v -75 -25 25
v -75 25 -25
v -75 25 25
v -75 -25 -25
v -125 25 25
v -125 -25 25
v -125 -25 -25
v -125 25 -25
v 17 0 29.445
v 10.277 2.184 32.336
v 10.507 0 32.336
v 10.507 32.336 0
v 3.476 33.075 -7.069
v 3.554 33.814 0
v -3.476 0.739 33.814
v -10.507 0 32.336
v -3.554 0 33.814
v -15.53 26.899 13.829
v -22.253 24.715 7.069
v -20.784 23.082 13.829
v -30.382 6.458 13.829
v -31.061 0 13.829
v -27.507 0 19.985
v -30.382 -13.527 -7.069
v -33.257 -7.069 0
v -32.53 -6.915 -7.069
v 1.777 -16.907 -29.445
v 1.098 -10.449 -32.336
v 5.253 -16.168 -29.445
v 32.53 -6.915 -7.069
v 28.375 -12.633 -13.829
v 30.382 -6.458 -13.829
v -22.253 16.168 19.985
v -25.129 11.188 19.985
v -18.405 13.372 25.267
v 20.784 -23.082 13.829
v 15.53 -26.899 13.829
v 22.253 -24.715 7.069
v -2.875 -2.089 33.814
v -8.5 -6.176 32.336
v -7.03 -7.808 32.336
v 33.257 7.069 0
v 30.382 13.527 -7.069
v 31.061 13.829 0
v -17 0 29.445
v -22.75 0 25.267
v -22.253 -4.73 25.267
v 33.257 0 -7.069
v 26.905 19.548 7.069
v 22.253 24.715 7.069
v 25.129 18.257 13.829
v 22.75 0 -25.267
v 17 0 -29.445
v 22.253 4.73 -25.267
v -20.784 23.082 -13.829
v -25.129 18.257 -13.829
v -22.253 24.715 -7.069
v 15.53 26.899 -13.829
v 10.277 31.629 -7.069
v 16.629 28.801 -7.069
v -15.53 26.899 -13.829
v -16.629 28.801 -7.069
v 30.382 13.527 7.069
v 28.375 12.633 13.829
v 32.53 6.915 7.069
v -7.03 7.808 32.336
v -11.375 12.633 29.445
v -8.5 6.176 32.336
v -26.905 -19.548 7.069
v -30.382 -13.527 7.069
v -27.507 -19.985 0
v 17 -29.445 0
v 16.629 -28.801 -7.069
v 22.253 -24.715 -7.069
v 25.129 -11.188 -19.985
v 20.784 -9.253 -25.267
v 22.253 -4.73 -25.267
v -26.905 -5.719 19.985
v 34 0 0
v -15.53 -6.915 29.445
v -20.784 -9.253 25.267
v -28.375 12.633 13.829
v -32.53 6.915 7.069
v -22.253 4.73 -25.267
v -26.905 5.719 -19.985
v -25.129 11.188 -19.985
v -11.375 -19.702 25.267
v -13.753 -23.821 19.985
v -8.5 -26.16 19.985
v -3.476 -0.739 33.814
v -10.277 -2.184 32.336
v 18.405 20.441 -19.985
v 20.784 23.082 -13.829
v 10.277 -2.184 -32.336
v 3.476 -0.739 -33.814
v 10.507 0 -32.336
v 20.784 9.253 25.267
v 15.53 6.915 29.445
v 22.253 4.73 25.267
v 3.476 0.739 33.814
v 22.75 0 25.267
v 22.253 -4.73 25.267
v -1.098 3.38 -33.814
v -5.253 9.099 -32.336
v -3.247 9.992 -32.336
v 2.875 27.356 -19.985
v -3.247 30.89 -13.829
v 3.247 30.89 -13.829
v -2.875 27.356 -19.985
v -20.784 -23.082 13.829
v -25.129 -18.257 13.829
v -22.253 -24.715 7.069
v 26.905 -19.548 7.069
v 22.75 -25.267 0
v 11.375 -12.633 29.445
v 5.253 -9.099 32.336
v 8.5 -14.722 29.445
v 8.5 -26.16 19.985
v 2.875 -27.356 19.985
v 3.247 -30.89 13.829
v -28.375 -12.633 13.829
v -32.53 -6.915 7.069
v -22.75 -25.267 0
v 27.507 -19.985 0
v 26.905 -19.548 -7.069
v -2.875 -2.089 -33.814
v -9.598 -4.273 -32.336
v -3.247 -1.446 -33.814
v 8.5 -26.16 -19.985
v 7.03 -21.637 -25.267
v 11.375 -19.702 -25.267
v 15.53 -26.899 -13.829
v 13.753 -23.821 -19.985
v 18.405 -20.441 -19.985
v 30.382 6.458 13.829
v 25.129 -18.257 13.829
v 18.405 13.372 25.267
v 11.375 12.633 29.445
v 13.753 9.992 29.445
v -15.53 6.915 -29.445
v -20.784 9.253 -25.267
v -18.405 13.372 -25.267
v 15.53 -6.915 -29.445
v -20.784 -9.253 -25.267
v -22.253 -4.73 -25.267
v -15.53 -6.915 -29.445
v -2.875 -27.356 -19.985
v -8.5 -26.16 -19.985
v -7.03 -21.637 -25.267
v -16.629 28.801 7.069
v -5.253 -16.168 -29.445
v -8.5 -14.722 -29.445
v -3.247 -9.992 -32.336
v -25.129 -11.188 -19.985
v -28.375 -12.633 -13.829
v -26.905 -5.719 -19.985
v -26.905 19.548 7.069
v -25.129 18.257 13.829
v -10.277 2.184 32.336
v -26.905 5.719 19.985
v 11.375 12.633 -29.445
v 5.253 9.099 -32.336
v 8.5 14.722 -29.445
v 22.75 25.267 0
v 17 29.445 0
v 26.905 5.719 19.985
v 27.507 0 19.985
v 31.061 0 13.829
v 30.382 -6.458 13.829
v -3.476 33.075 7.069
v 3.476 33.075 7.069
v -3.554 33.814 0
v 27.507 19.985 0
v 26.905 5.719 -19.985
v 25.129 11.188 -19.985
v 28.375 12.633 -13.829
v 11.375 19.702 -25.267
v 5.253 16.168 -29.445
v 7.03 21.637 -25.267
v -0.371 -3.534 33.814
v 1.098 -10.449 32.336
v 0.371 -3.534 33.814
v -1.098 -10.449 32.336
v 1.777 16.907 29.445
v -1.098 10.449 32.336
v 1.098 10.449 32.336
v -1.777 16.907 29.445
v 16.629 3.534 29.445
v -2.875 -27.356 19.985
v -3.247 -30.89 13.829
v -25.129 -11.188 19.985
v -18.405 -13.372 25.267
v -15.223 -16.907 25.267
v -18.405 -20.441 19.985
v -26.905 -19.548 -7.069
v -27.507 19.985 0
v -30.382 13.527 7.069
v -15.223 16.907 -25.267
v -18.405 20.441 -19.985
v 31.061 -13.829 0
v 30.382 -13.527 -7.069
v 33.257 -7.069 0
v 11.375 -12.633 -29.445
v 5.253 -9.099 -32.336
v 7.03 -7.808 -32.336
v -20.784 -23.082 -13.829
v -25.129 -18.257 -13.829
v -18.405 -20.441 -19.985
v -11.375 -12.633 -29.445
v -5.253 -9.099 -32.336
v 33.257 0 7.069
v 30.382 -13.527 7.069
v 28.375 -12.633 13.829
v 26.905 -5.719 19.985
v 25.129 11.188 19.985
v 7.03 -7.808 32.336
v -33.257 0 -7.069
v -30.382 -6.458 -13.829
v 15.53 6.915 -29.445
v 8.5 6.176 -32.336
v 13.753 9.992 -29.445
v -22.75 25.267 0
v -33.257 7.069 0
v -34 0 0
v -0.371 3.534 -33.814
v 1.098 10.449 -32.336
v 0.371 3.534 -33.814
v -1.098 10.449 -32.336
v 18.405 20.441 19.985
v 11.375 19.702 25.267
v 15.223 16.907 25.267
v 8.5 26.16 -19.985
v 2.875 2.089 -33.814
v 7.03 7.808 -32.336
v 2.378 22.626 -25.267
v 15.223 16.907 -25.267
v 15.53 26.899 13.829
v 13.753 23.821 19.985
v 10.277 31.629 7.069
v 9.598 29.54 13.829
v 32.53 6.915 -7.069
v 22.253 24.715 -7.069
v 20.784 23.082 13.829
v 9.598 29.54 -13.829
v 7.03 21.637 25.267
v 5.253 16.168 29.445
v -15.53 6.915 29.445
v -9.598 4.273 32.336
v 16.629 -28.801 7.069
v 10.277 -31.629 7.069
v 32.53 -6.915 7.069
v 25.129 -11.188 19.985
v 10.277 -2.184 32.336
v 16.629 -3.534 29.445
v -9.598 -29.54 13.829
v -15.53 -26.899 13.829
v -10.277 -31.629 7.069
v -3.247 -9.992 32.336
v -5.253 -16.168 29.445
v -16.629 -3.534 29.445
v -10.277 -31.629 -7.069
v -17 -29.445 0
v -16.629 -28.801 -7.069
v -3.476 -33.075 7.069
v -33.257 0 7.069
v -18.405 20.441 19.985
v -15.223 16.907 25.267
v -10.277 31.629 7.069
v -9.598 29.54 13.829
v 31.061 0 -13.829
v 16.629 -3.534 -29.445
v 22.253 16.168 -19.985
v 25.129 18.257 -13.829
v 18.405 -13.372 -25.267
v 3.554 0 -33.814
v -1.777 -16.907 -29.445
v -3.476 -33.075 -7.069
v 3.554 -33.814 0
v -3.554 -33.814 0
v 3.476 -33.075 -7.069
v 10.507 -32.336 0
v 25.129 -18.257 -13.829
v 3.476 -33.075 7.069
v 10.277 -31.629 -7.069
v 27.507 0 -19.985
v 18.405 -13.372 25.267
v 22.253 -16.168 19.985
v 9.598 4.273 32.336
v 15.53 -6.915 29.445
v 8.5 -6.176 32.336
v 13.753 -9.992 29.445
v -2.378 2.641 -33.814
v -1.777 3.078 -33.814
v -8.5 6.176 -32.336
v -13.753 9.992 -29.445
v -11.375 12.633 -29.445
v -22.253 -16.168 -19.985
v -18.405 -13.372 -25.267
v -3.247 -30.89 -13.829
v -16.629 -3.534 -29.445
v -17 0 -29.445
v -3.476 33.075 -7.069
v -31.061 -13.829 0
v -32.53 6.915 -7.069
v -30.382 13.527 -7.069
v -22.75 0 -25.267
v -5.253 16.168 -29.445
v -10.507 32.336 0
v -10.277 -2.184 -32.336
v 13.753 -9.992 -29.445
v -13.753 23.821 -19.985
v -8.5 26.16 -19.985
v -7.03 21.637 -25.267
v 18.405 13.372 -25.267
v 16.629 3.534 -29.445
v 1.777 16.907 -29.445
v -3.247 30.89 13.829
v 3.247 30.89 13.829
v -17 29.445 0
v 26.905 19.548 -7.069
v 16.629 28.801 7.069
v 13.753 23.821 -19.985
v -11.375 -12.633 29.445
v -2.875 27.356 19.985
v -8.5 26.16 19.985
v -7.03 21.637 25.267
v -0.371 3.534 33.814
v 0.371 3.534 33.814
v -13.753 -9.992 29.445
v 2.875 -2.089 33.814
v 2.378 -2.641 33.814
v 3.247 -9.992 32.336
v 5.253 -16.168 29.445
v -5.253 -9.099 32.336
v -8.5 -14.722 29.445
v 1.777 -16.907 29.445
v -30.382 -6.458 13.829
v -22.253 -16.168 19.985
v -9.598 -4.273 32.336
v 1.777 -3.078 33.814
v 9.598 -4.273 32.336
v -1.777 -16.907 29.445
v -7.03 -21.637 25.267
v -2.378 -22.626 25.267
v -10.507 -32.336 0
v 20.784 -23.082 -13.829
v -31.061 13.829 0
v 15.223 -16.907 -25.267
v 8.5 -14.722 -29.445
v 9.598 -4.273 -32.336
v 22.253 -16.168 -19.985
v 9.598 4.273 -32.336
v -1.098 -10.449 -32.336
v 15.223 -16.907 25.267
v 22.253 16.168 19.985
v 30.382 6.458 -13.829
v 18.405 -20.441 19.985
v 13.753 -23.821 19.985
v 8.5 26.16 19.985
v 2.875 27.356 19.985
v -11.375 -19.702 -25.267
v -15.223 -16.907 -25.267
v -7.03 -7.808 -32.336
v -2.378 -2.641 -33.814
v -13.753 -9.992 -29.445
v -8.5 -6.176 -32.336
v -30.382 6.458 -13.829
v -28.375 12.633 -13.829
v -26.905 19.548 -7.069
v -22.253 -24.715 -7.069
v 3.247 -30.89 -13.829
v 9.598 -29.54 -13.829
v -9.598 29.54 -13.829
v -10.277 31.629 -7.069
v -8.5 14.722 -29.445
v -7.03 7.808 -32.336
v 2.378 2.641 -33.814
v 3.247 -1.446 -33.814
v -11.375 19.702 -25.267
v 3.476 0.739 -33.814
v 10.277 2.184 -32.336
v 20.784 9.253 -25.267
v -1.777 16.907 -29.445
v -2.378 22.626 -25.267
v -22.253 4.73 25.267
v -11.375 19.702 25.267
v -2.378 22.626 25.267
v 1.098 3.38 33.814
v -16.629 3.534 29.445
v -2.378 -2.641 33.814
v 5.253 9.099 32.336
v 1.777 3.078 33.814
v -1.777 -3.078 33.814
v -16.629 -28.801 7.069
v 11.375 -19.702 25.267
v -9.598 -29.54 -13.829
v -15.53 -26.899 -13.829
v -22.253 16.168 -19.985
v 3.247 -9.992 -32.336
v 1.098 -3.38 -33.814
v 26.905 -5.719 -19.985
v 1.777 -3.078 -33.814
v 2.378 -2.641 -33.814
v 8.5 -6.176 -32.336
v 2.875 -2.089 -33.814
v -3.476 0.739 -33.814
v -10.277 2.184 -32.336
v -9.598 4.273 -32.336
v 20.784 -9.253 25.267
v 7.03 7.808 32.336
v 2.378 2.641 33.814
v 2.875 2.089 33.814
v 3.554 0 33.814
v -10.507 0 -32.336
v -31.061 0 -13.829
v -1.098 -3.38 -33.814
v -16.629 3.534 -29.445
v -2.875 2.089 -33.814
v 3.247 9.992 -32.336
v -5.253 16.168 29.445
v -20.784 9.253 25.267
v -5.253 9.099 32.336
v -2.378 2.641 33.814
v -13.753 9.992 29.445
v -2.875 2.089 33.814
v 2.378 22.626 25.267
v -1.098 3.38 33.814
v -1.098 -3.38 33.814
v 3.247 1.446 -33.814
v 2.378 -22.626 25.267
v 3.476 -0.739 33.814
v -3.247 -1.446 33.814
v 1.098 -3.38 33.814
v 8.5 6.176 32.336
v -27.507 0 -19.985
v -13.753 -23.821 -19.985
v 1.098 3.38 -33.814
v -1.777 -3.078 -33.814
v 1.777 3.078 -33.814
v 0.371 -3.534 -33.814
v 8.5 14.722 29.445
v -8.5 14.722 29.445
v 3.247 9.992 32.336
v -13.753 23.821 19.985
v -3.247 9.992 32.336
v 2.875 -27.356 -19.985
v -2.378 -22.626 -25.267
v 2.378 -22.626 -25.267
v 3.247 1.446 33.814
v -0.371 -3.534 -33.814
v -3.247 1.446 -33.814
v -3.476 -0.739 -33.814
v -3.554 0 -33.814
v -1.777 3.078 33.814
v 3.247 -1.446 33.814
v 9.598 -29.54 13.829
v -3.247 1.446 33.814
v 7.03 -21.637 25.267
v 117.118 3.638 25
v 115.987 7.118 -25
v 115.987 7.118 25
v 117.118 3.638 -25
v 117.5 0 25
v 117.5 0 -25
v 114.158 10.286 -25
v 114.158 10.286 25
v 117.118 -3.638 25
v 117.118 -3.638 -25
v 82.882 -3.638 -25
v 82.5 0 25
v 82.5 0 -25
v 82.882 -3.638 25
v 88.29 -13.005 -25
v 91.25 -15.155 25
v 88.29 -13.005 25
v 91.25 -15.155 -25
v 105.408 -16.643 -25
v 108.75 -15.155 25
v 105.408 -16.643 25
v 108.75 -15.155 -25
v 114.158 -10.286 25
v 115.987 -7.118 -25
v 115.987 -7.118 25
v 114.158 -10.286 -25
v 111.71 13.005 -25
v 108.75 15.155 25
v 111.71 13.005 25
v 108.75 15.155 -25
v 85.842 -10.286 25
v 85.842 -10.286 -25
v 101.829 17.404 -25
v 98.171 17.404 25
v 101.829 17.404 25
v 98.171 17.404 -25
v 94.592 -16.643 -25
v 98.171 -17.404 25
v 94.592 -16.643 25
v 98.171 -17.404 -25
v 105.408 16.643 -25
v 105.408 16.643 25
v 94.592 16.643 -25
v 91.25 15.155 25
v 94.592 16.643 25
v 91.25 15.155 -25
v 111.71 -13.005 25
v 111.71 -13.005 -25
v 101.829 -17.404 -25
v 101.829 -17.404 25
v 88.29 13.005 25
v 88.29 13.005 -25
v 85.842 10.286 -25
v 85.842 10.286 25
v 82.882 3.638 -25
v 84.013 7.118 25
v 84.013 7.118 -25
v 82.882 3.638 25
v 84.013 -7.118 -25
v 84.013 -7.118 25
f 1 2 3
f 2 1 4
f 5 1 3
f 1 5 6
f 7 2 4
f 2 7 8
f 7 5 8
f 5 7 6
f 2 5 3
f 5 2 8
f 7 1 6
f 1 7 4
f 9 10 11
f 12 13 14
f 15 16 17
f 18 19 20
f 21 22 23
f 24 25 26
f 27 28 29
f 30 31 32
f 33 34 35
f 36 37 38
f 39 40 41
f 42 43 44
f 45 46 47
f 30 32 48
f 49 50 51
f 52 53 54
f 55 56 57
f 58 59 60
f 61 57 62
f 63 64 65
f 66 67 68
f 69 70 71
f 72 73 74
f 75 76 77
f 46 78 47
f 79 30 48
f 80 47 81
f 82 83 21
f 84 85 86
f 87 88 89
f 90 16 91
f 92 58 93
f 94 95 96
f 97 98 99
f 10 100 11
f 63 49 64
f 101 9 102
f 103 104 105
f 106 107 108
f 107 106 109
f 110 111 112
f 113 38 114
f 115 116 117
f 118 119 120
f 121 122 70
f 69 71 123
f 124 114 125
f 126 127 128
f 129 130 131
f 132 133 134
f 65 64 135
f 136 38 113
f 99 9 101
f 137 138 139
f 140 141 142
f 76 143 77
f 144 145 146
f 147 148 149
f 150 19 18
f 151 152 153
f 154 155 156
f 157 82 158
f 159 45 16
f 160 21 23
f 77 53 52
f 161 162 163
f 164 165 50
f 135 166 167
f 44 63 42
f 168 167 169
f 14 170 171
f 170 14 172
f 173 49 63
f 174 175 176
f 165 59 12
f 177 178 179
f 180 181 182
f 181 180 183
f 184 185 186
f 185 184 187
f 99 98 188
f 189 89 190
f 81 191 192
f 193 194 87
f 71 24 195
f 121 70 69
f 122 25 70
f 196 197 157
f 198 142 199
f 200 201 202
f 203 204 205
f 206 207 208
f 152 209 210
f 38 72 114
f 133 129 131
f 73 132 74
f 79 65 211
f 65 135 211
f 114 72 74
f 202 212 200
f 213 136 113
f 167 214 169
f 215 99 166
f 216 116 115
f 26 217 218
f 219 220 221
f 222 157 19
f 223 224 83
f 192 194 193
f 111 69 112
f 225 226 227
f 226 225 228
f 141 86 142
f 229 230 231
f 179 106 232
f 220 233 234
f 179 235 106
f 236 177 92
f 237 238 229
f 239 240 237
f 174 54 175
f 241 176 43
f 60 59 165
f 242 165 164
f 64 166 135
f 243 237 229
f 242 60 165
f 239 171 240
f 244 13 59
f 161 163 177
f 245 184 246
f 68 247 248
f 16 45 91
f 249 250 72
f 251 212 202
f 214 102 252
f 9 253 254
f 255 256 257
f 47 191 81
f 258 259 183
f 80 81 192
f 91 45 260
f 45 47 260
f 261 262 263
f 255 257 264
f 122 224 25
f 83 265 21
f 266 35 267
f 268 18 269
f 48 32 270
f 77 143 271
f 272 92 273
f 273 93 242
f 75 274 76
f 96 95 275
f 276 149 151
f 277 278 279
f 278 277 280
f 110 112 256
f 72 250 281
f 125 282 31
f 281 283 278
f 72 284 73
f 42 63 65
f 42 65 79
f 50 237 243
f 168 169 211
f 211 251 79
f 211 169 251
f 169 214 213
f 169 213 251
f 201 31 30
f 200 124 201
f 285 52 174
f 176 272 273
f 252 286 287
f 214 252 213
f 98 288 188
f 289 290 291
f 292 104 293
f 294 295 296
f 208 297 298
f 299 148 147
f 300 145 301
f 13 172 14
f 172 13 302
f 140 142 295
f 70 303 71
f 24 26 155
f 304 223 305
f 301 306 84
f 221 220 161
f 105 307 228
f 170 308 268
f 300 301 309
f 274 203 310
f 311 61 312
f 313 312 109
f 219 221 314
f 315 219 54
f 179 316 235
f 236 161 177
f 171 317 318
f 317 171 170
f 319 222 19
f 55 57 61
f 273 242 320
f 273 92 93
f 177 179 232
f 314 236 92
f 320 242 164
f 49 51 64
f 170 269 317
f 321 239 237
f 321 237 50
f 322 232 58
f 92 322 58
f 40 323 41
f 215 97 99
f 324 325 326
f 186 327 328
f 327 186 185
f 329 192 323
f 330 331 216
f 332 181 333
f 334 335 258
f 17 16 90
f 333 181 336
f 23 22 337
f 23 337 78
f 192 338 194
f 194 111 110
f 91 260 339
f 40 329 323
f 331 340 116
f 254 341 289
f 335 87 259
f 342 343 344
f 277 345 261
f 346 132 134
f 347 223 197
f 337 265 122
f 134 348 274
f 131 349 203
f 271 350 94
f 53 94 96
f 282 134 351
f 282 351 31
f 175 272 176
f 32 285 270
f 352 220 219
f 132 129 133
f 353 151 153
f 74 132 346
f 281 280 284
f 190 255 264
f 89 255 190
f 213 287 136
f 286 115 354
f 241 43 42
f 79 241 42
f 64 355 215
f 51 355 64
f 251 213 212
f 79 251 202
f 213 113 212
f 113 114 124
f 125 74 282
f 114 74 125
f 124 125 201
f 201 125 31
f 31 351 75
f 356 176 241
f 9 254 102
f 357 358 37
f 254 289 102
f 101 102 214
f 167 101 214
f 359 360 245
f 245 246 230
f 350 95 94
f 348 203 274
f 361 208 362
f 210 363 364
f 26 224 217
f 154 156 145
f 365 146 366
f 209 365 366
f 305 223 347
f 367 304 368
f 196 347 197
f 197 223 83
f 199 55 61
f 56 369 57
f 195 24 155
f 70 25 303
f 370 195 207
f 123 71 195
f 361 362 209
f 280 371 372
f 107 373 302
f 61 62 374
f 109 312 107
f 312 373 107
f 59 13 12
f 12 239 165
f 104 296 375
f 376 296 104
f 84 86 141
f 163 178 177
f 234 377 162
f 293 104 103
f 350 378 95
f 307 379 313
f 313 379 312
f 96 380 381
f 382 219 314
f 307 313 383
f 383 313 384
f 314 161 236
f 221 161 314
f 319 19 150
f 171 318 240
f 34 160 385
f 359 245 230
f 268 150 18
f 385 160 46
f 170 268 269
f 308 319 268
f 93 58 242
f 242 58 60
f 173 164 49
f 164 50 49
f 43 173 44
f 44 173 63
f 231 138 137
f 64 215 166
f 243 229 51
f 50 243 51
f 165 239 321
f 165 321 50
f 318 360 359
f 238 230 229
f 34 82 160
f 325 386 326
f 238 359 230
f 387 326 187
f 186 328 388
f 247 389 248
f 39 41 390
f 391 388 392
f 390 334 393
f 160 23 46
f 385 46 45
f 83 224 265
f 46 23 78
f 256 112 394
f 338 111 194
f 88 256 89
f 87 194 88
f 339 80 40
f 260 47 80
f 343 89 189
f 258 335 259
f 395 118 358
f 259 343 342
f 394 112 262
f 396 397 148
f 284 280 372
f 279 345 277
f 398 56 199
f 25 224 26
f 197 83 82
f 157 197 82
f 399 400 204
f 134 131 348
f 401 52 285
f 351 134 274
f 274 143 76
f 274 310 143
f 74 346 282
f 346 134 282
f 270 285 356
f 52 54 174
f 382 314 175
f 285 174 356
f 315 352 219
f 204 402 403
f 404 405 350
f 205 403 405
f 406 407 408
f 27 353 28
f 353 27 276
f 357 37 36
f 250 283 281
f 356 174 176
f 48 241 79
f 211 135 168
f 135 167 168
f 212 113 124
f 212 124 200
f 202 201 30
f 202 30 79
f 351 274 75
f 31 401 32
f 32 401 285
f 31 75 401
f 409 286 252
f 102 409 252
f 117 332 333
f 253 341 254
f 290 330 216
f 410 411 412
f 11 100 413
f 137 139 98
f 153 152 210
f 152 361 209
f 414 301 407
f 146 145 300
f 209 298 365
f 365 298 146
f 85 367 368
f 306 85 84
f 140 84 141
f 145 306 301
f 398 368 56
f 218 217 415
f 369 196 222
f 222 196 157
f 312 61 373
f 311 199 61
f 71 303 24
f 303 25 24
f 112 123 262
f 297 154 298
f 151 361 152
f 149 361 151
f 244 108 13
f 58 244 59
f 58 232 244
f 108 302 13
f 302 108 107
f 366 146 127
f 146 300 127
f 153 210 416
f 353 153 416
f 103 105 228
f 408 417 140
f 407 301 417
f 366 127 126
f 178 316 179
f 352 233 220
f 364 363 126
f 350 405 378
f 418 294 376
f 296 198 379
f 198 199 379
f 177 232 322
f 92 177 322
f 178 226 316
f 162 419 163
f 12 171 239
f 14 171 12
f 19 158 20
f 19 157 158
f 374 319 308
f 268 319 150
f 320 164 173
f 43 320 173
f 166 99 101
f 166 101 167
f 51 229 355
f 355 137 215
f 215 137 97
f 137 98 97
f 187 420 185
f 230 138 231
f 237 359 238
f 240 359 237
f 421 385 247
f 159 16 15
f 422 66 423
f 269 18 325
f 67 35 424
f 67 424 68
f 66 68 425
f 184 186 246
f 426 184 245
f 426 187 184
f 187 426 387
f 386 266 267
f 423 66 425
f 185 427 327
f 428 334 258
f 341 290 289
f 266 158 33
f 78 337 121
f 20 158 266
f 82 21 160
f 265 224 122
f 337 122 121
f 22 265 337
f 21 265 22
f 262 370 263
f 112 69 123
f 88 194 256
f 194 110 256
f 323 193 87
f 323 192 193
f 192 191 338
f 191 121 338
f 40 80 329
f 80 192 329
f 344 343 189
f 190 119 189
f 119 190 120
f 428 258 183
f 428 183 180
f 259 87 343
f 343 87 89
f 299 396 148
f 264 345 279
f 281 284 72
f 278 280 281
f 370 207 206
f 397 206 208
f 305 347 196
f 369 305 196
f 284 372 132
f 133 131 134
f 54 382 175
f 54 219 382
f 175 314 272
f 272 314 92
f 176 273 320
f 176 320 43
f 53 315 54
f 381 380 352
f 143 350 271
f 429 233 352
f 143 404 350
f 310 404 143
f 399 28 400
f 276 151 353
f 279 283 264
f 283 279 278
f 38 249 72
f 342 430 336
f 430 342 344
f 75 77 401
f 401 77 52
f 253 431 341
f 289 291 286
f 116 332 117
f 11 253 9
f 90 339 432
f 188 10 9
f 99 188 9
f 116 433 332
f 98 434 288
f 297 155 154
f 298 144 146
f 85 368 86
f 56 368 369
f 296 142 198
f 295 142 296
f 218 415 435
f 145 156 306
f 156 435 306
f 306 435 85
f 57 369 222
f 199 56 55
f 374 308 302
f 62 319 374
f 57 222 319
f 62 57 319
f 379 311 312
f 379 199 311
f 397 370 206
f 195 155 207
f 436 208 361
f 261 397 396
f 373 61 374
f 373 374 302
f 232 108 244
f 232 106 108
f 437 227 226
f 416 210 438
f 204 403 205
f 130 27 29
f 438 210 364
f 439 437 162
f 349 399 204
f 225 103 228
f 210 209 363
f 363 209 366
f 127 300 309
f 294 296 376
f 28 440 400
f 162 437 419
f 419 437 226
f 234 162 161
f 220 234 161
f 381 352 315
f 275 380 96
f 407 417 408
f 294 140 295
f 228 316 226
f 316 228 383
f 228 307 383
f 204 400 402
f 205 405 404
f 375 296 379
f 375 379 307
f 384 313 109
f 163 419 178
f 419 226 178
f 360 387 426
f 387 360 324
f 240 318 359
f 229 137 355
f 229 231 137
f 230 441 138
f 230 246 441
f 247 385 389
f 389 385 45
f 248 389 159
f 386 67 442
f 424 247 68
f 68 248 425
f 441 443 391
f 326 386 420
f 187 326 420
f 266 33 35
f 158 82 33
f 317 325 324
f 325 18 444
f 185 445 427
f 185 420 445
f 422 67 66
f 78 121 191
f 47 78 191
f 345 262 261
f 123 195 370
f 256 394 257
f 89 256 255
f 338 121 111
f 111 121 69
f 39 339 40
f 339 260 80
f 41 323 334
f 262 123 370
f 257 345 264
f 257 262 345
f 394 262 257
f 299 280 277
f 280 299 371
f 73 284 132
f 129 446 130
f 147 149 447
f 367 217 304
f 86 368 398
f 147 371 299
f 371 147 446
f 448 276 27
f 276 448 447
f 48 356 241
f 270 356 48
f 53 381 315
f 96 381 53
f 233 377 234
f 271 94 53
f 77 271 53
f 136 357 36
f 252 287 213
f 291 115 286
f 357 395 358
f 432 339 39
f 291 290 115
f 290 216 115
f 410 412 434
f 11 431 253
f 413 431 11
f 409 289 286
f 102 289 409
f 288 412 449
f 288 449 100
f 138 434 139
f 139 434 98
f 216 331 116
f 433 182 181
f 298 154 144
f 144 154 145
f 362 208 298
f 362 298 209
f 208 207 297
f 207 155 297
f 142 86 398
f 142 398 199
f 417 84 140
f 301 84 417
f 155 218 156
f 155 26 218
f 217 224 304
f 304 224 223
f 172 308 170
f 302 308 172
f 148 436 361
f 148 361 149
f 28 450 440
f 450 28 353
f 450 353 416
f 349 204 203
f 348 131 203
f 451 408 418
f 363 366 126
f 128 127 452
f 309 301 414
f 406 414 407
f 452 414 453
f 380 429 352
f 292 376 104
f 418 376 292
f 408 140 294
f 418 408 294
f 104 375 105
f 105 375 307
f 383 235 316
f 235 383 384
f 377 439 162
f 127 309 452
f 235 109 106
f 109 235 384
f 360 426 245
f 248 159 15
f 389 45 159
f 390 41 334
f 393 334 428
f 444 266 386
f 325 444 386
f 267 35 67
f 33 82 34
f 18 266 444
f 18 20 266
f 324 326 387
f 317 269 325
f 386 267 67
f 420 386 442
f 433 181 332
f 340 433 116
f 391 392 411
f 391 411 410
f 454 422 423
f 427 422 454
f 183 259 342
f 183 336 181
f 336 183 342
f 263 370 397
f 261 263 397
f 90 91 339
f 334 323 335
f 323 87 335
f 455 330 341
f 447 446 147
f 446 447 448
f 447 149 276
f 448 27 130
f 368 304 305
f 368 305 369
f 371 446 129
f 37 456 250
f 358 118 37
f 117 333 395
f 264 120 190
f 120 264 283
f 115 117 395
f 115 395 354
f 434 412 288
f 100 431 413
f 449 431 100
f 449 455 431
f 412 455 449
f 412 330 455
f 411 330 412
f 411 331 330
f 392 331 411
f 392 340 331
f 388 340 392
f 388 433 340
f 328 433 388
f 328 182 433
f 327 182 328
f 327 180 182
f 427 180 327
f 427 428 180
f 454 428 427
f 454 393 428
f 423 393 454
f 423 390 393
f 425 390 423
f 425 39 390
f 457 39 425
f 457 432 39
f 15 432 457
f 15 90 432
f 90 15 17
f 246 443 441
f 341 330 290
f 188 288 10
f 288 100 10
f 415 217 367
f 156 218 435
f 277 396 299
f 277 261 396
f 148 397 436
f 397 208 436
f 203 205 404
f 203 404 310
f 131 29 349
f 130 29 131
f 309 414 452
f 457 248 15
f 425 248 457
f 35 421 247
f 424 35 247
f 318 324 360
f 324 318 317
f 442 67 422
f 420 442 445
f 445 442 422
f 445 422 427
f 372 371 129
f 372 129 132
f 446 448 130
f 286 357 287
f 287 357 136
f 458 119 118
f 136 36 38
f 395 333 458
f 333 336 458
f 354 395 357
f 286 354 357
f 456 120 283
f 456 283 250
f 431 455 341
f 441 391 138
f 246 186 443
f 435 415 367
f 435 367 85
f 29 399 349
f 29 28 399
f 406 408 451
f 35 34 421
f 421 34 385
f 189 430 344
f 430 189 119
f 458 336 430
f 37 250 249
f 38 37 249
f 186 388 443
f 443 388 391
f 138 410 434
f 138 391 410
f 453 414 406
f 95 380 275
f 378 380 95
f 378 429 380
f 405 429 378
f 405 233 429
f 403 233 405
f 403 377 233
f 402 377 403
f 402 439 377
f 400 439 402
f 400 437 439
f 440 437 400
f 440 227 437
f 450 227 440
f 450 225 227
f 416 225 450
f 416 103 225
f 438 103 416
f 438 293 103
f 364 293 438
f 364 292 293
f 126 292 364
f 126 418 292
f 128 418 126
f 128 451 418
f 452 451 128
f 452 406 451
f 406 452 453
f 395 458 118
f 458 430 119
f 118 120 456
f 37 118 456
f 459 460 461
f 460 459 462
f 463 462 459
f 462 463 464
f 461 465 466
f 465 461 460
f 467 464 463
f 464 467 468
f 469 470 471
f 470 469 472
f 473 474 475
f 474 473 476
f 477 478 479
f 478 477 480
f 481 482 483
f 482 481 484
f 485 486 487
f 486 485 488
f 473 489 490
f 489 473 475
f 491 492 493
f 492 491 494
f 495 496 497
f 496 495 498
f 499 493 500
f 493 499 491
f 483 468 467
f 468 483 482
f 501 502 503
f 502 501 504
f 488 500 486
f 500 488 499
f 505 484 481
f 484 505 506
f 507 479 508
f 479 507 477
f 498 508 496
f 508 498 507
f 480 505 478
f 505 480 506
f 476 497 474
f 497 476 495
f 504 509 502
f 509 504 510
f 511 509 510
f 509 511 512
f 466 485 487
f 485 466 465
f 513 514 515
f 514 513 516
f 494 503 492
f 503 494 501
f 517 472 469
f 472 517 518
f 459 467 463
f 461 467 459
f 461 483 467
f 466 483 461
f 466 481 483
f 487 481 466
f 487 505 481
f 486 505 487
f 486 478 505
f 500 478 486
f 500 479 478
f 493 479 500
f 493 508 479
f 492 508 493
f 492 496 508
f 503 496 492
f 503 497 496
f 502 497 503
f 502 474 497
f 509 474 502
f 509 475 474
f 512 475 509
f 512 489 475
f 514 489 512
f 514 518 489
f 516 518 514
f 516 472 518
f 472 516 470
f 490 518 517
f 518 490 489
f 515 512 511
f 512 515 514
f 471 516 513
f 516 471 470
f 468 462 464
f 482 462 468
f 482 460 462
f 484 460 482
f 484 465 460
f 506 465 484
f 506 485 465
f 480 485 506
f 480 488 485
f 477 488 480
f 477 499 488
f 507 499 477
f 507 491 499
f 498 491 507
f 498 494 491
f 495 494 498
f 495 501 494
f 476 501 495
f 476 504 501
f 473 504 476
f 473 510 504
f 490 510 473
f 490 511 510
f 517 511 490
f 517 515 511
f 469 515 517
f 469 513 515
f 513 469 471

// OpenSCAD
//$fn = 30;

translate([-100,0,0])
    color("red")  cube([50, 50, 50],  center = true);

color("blue") sphere(d = 68);


translate([100,0,0]) 
    color("green") cylinder(h=50, d = 35,  center = true);
